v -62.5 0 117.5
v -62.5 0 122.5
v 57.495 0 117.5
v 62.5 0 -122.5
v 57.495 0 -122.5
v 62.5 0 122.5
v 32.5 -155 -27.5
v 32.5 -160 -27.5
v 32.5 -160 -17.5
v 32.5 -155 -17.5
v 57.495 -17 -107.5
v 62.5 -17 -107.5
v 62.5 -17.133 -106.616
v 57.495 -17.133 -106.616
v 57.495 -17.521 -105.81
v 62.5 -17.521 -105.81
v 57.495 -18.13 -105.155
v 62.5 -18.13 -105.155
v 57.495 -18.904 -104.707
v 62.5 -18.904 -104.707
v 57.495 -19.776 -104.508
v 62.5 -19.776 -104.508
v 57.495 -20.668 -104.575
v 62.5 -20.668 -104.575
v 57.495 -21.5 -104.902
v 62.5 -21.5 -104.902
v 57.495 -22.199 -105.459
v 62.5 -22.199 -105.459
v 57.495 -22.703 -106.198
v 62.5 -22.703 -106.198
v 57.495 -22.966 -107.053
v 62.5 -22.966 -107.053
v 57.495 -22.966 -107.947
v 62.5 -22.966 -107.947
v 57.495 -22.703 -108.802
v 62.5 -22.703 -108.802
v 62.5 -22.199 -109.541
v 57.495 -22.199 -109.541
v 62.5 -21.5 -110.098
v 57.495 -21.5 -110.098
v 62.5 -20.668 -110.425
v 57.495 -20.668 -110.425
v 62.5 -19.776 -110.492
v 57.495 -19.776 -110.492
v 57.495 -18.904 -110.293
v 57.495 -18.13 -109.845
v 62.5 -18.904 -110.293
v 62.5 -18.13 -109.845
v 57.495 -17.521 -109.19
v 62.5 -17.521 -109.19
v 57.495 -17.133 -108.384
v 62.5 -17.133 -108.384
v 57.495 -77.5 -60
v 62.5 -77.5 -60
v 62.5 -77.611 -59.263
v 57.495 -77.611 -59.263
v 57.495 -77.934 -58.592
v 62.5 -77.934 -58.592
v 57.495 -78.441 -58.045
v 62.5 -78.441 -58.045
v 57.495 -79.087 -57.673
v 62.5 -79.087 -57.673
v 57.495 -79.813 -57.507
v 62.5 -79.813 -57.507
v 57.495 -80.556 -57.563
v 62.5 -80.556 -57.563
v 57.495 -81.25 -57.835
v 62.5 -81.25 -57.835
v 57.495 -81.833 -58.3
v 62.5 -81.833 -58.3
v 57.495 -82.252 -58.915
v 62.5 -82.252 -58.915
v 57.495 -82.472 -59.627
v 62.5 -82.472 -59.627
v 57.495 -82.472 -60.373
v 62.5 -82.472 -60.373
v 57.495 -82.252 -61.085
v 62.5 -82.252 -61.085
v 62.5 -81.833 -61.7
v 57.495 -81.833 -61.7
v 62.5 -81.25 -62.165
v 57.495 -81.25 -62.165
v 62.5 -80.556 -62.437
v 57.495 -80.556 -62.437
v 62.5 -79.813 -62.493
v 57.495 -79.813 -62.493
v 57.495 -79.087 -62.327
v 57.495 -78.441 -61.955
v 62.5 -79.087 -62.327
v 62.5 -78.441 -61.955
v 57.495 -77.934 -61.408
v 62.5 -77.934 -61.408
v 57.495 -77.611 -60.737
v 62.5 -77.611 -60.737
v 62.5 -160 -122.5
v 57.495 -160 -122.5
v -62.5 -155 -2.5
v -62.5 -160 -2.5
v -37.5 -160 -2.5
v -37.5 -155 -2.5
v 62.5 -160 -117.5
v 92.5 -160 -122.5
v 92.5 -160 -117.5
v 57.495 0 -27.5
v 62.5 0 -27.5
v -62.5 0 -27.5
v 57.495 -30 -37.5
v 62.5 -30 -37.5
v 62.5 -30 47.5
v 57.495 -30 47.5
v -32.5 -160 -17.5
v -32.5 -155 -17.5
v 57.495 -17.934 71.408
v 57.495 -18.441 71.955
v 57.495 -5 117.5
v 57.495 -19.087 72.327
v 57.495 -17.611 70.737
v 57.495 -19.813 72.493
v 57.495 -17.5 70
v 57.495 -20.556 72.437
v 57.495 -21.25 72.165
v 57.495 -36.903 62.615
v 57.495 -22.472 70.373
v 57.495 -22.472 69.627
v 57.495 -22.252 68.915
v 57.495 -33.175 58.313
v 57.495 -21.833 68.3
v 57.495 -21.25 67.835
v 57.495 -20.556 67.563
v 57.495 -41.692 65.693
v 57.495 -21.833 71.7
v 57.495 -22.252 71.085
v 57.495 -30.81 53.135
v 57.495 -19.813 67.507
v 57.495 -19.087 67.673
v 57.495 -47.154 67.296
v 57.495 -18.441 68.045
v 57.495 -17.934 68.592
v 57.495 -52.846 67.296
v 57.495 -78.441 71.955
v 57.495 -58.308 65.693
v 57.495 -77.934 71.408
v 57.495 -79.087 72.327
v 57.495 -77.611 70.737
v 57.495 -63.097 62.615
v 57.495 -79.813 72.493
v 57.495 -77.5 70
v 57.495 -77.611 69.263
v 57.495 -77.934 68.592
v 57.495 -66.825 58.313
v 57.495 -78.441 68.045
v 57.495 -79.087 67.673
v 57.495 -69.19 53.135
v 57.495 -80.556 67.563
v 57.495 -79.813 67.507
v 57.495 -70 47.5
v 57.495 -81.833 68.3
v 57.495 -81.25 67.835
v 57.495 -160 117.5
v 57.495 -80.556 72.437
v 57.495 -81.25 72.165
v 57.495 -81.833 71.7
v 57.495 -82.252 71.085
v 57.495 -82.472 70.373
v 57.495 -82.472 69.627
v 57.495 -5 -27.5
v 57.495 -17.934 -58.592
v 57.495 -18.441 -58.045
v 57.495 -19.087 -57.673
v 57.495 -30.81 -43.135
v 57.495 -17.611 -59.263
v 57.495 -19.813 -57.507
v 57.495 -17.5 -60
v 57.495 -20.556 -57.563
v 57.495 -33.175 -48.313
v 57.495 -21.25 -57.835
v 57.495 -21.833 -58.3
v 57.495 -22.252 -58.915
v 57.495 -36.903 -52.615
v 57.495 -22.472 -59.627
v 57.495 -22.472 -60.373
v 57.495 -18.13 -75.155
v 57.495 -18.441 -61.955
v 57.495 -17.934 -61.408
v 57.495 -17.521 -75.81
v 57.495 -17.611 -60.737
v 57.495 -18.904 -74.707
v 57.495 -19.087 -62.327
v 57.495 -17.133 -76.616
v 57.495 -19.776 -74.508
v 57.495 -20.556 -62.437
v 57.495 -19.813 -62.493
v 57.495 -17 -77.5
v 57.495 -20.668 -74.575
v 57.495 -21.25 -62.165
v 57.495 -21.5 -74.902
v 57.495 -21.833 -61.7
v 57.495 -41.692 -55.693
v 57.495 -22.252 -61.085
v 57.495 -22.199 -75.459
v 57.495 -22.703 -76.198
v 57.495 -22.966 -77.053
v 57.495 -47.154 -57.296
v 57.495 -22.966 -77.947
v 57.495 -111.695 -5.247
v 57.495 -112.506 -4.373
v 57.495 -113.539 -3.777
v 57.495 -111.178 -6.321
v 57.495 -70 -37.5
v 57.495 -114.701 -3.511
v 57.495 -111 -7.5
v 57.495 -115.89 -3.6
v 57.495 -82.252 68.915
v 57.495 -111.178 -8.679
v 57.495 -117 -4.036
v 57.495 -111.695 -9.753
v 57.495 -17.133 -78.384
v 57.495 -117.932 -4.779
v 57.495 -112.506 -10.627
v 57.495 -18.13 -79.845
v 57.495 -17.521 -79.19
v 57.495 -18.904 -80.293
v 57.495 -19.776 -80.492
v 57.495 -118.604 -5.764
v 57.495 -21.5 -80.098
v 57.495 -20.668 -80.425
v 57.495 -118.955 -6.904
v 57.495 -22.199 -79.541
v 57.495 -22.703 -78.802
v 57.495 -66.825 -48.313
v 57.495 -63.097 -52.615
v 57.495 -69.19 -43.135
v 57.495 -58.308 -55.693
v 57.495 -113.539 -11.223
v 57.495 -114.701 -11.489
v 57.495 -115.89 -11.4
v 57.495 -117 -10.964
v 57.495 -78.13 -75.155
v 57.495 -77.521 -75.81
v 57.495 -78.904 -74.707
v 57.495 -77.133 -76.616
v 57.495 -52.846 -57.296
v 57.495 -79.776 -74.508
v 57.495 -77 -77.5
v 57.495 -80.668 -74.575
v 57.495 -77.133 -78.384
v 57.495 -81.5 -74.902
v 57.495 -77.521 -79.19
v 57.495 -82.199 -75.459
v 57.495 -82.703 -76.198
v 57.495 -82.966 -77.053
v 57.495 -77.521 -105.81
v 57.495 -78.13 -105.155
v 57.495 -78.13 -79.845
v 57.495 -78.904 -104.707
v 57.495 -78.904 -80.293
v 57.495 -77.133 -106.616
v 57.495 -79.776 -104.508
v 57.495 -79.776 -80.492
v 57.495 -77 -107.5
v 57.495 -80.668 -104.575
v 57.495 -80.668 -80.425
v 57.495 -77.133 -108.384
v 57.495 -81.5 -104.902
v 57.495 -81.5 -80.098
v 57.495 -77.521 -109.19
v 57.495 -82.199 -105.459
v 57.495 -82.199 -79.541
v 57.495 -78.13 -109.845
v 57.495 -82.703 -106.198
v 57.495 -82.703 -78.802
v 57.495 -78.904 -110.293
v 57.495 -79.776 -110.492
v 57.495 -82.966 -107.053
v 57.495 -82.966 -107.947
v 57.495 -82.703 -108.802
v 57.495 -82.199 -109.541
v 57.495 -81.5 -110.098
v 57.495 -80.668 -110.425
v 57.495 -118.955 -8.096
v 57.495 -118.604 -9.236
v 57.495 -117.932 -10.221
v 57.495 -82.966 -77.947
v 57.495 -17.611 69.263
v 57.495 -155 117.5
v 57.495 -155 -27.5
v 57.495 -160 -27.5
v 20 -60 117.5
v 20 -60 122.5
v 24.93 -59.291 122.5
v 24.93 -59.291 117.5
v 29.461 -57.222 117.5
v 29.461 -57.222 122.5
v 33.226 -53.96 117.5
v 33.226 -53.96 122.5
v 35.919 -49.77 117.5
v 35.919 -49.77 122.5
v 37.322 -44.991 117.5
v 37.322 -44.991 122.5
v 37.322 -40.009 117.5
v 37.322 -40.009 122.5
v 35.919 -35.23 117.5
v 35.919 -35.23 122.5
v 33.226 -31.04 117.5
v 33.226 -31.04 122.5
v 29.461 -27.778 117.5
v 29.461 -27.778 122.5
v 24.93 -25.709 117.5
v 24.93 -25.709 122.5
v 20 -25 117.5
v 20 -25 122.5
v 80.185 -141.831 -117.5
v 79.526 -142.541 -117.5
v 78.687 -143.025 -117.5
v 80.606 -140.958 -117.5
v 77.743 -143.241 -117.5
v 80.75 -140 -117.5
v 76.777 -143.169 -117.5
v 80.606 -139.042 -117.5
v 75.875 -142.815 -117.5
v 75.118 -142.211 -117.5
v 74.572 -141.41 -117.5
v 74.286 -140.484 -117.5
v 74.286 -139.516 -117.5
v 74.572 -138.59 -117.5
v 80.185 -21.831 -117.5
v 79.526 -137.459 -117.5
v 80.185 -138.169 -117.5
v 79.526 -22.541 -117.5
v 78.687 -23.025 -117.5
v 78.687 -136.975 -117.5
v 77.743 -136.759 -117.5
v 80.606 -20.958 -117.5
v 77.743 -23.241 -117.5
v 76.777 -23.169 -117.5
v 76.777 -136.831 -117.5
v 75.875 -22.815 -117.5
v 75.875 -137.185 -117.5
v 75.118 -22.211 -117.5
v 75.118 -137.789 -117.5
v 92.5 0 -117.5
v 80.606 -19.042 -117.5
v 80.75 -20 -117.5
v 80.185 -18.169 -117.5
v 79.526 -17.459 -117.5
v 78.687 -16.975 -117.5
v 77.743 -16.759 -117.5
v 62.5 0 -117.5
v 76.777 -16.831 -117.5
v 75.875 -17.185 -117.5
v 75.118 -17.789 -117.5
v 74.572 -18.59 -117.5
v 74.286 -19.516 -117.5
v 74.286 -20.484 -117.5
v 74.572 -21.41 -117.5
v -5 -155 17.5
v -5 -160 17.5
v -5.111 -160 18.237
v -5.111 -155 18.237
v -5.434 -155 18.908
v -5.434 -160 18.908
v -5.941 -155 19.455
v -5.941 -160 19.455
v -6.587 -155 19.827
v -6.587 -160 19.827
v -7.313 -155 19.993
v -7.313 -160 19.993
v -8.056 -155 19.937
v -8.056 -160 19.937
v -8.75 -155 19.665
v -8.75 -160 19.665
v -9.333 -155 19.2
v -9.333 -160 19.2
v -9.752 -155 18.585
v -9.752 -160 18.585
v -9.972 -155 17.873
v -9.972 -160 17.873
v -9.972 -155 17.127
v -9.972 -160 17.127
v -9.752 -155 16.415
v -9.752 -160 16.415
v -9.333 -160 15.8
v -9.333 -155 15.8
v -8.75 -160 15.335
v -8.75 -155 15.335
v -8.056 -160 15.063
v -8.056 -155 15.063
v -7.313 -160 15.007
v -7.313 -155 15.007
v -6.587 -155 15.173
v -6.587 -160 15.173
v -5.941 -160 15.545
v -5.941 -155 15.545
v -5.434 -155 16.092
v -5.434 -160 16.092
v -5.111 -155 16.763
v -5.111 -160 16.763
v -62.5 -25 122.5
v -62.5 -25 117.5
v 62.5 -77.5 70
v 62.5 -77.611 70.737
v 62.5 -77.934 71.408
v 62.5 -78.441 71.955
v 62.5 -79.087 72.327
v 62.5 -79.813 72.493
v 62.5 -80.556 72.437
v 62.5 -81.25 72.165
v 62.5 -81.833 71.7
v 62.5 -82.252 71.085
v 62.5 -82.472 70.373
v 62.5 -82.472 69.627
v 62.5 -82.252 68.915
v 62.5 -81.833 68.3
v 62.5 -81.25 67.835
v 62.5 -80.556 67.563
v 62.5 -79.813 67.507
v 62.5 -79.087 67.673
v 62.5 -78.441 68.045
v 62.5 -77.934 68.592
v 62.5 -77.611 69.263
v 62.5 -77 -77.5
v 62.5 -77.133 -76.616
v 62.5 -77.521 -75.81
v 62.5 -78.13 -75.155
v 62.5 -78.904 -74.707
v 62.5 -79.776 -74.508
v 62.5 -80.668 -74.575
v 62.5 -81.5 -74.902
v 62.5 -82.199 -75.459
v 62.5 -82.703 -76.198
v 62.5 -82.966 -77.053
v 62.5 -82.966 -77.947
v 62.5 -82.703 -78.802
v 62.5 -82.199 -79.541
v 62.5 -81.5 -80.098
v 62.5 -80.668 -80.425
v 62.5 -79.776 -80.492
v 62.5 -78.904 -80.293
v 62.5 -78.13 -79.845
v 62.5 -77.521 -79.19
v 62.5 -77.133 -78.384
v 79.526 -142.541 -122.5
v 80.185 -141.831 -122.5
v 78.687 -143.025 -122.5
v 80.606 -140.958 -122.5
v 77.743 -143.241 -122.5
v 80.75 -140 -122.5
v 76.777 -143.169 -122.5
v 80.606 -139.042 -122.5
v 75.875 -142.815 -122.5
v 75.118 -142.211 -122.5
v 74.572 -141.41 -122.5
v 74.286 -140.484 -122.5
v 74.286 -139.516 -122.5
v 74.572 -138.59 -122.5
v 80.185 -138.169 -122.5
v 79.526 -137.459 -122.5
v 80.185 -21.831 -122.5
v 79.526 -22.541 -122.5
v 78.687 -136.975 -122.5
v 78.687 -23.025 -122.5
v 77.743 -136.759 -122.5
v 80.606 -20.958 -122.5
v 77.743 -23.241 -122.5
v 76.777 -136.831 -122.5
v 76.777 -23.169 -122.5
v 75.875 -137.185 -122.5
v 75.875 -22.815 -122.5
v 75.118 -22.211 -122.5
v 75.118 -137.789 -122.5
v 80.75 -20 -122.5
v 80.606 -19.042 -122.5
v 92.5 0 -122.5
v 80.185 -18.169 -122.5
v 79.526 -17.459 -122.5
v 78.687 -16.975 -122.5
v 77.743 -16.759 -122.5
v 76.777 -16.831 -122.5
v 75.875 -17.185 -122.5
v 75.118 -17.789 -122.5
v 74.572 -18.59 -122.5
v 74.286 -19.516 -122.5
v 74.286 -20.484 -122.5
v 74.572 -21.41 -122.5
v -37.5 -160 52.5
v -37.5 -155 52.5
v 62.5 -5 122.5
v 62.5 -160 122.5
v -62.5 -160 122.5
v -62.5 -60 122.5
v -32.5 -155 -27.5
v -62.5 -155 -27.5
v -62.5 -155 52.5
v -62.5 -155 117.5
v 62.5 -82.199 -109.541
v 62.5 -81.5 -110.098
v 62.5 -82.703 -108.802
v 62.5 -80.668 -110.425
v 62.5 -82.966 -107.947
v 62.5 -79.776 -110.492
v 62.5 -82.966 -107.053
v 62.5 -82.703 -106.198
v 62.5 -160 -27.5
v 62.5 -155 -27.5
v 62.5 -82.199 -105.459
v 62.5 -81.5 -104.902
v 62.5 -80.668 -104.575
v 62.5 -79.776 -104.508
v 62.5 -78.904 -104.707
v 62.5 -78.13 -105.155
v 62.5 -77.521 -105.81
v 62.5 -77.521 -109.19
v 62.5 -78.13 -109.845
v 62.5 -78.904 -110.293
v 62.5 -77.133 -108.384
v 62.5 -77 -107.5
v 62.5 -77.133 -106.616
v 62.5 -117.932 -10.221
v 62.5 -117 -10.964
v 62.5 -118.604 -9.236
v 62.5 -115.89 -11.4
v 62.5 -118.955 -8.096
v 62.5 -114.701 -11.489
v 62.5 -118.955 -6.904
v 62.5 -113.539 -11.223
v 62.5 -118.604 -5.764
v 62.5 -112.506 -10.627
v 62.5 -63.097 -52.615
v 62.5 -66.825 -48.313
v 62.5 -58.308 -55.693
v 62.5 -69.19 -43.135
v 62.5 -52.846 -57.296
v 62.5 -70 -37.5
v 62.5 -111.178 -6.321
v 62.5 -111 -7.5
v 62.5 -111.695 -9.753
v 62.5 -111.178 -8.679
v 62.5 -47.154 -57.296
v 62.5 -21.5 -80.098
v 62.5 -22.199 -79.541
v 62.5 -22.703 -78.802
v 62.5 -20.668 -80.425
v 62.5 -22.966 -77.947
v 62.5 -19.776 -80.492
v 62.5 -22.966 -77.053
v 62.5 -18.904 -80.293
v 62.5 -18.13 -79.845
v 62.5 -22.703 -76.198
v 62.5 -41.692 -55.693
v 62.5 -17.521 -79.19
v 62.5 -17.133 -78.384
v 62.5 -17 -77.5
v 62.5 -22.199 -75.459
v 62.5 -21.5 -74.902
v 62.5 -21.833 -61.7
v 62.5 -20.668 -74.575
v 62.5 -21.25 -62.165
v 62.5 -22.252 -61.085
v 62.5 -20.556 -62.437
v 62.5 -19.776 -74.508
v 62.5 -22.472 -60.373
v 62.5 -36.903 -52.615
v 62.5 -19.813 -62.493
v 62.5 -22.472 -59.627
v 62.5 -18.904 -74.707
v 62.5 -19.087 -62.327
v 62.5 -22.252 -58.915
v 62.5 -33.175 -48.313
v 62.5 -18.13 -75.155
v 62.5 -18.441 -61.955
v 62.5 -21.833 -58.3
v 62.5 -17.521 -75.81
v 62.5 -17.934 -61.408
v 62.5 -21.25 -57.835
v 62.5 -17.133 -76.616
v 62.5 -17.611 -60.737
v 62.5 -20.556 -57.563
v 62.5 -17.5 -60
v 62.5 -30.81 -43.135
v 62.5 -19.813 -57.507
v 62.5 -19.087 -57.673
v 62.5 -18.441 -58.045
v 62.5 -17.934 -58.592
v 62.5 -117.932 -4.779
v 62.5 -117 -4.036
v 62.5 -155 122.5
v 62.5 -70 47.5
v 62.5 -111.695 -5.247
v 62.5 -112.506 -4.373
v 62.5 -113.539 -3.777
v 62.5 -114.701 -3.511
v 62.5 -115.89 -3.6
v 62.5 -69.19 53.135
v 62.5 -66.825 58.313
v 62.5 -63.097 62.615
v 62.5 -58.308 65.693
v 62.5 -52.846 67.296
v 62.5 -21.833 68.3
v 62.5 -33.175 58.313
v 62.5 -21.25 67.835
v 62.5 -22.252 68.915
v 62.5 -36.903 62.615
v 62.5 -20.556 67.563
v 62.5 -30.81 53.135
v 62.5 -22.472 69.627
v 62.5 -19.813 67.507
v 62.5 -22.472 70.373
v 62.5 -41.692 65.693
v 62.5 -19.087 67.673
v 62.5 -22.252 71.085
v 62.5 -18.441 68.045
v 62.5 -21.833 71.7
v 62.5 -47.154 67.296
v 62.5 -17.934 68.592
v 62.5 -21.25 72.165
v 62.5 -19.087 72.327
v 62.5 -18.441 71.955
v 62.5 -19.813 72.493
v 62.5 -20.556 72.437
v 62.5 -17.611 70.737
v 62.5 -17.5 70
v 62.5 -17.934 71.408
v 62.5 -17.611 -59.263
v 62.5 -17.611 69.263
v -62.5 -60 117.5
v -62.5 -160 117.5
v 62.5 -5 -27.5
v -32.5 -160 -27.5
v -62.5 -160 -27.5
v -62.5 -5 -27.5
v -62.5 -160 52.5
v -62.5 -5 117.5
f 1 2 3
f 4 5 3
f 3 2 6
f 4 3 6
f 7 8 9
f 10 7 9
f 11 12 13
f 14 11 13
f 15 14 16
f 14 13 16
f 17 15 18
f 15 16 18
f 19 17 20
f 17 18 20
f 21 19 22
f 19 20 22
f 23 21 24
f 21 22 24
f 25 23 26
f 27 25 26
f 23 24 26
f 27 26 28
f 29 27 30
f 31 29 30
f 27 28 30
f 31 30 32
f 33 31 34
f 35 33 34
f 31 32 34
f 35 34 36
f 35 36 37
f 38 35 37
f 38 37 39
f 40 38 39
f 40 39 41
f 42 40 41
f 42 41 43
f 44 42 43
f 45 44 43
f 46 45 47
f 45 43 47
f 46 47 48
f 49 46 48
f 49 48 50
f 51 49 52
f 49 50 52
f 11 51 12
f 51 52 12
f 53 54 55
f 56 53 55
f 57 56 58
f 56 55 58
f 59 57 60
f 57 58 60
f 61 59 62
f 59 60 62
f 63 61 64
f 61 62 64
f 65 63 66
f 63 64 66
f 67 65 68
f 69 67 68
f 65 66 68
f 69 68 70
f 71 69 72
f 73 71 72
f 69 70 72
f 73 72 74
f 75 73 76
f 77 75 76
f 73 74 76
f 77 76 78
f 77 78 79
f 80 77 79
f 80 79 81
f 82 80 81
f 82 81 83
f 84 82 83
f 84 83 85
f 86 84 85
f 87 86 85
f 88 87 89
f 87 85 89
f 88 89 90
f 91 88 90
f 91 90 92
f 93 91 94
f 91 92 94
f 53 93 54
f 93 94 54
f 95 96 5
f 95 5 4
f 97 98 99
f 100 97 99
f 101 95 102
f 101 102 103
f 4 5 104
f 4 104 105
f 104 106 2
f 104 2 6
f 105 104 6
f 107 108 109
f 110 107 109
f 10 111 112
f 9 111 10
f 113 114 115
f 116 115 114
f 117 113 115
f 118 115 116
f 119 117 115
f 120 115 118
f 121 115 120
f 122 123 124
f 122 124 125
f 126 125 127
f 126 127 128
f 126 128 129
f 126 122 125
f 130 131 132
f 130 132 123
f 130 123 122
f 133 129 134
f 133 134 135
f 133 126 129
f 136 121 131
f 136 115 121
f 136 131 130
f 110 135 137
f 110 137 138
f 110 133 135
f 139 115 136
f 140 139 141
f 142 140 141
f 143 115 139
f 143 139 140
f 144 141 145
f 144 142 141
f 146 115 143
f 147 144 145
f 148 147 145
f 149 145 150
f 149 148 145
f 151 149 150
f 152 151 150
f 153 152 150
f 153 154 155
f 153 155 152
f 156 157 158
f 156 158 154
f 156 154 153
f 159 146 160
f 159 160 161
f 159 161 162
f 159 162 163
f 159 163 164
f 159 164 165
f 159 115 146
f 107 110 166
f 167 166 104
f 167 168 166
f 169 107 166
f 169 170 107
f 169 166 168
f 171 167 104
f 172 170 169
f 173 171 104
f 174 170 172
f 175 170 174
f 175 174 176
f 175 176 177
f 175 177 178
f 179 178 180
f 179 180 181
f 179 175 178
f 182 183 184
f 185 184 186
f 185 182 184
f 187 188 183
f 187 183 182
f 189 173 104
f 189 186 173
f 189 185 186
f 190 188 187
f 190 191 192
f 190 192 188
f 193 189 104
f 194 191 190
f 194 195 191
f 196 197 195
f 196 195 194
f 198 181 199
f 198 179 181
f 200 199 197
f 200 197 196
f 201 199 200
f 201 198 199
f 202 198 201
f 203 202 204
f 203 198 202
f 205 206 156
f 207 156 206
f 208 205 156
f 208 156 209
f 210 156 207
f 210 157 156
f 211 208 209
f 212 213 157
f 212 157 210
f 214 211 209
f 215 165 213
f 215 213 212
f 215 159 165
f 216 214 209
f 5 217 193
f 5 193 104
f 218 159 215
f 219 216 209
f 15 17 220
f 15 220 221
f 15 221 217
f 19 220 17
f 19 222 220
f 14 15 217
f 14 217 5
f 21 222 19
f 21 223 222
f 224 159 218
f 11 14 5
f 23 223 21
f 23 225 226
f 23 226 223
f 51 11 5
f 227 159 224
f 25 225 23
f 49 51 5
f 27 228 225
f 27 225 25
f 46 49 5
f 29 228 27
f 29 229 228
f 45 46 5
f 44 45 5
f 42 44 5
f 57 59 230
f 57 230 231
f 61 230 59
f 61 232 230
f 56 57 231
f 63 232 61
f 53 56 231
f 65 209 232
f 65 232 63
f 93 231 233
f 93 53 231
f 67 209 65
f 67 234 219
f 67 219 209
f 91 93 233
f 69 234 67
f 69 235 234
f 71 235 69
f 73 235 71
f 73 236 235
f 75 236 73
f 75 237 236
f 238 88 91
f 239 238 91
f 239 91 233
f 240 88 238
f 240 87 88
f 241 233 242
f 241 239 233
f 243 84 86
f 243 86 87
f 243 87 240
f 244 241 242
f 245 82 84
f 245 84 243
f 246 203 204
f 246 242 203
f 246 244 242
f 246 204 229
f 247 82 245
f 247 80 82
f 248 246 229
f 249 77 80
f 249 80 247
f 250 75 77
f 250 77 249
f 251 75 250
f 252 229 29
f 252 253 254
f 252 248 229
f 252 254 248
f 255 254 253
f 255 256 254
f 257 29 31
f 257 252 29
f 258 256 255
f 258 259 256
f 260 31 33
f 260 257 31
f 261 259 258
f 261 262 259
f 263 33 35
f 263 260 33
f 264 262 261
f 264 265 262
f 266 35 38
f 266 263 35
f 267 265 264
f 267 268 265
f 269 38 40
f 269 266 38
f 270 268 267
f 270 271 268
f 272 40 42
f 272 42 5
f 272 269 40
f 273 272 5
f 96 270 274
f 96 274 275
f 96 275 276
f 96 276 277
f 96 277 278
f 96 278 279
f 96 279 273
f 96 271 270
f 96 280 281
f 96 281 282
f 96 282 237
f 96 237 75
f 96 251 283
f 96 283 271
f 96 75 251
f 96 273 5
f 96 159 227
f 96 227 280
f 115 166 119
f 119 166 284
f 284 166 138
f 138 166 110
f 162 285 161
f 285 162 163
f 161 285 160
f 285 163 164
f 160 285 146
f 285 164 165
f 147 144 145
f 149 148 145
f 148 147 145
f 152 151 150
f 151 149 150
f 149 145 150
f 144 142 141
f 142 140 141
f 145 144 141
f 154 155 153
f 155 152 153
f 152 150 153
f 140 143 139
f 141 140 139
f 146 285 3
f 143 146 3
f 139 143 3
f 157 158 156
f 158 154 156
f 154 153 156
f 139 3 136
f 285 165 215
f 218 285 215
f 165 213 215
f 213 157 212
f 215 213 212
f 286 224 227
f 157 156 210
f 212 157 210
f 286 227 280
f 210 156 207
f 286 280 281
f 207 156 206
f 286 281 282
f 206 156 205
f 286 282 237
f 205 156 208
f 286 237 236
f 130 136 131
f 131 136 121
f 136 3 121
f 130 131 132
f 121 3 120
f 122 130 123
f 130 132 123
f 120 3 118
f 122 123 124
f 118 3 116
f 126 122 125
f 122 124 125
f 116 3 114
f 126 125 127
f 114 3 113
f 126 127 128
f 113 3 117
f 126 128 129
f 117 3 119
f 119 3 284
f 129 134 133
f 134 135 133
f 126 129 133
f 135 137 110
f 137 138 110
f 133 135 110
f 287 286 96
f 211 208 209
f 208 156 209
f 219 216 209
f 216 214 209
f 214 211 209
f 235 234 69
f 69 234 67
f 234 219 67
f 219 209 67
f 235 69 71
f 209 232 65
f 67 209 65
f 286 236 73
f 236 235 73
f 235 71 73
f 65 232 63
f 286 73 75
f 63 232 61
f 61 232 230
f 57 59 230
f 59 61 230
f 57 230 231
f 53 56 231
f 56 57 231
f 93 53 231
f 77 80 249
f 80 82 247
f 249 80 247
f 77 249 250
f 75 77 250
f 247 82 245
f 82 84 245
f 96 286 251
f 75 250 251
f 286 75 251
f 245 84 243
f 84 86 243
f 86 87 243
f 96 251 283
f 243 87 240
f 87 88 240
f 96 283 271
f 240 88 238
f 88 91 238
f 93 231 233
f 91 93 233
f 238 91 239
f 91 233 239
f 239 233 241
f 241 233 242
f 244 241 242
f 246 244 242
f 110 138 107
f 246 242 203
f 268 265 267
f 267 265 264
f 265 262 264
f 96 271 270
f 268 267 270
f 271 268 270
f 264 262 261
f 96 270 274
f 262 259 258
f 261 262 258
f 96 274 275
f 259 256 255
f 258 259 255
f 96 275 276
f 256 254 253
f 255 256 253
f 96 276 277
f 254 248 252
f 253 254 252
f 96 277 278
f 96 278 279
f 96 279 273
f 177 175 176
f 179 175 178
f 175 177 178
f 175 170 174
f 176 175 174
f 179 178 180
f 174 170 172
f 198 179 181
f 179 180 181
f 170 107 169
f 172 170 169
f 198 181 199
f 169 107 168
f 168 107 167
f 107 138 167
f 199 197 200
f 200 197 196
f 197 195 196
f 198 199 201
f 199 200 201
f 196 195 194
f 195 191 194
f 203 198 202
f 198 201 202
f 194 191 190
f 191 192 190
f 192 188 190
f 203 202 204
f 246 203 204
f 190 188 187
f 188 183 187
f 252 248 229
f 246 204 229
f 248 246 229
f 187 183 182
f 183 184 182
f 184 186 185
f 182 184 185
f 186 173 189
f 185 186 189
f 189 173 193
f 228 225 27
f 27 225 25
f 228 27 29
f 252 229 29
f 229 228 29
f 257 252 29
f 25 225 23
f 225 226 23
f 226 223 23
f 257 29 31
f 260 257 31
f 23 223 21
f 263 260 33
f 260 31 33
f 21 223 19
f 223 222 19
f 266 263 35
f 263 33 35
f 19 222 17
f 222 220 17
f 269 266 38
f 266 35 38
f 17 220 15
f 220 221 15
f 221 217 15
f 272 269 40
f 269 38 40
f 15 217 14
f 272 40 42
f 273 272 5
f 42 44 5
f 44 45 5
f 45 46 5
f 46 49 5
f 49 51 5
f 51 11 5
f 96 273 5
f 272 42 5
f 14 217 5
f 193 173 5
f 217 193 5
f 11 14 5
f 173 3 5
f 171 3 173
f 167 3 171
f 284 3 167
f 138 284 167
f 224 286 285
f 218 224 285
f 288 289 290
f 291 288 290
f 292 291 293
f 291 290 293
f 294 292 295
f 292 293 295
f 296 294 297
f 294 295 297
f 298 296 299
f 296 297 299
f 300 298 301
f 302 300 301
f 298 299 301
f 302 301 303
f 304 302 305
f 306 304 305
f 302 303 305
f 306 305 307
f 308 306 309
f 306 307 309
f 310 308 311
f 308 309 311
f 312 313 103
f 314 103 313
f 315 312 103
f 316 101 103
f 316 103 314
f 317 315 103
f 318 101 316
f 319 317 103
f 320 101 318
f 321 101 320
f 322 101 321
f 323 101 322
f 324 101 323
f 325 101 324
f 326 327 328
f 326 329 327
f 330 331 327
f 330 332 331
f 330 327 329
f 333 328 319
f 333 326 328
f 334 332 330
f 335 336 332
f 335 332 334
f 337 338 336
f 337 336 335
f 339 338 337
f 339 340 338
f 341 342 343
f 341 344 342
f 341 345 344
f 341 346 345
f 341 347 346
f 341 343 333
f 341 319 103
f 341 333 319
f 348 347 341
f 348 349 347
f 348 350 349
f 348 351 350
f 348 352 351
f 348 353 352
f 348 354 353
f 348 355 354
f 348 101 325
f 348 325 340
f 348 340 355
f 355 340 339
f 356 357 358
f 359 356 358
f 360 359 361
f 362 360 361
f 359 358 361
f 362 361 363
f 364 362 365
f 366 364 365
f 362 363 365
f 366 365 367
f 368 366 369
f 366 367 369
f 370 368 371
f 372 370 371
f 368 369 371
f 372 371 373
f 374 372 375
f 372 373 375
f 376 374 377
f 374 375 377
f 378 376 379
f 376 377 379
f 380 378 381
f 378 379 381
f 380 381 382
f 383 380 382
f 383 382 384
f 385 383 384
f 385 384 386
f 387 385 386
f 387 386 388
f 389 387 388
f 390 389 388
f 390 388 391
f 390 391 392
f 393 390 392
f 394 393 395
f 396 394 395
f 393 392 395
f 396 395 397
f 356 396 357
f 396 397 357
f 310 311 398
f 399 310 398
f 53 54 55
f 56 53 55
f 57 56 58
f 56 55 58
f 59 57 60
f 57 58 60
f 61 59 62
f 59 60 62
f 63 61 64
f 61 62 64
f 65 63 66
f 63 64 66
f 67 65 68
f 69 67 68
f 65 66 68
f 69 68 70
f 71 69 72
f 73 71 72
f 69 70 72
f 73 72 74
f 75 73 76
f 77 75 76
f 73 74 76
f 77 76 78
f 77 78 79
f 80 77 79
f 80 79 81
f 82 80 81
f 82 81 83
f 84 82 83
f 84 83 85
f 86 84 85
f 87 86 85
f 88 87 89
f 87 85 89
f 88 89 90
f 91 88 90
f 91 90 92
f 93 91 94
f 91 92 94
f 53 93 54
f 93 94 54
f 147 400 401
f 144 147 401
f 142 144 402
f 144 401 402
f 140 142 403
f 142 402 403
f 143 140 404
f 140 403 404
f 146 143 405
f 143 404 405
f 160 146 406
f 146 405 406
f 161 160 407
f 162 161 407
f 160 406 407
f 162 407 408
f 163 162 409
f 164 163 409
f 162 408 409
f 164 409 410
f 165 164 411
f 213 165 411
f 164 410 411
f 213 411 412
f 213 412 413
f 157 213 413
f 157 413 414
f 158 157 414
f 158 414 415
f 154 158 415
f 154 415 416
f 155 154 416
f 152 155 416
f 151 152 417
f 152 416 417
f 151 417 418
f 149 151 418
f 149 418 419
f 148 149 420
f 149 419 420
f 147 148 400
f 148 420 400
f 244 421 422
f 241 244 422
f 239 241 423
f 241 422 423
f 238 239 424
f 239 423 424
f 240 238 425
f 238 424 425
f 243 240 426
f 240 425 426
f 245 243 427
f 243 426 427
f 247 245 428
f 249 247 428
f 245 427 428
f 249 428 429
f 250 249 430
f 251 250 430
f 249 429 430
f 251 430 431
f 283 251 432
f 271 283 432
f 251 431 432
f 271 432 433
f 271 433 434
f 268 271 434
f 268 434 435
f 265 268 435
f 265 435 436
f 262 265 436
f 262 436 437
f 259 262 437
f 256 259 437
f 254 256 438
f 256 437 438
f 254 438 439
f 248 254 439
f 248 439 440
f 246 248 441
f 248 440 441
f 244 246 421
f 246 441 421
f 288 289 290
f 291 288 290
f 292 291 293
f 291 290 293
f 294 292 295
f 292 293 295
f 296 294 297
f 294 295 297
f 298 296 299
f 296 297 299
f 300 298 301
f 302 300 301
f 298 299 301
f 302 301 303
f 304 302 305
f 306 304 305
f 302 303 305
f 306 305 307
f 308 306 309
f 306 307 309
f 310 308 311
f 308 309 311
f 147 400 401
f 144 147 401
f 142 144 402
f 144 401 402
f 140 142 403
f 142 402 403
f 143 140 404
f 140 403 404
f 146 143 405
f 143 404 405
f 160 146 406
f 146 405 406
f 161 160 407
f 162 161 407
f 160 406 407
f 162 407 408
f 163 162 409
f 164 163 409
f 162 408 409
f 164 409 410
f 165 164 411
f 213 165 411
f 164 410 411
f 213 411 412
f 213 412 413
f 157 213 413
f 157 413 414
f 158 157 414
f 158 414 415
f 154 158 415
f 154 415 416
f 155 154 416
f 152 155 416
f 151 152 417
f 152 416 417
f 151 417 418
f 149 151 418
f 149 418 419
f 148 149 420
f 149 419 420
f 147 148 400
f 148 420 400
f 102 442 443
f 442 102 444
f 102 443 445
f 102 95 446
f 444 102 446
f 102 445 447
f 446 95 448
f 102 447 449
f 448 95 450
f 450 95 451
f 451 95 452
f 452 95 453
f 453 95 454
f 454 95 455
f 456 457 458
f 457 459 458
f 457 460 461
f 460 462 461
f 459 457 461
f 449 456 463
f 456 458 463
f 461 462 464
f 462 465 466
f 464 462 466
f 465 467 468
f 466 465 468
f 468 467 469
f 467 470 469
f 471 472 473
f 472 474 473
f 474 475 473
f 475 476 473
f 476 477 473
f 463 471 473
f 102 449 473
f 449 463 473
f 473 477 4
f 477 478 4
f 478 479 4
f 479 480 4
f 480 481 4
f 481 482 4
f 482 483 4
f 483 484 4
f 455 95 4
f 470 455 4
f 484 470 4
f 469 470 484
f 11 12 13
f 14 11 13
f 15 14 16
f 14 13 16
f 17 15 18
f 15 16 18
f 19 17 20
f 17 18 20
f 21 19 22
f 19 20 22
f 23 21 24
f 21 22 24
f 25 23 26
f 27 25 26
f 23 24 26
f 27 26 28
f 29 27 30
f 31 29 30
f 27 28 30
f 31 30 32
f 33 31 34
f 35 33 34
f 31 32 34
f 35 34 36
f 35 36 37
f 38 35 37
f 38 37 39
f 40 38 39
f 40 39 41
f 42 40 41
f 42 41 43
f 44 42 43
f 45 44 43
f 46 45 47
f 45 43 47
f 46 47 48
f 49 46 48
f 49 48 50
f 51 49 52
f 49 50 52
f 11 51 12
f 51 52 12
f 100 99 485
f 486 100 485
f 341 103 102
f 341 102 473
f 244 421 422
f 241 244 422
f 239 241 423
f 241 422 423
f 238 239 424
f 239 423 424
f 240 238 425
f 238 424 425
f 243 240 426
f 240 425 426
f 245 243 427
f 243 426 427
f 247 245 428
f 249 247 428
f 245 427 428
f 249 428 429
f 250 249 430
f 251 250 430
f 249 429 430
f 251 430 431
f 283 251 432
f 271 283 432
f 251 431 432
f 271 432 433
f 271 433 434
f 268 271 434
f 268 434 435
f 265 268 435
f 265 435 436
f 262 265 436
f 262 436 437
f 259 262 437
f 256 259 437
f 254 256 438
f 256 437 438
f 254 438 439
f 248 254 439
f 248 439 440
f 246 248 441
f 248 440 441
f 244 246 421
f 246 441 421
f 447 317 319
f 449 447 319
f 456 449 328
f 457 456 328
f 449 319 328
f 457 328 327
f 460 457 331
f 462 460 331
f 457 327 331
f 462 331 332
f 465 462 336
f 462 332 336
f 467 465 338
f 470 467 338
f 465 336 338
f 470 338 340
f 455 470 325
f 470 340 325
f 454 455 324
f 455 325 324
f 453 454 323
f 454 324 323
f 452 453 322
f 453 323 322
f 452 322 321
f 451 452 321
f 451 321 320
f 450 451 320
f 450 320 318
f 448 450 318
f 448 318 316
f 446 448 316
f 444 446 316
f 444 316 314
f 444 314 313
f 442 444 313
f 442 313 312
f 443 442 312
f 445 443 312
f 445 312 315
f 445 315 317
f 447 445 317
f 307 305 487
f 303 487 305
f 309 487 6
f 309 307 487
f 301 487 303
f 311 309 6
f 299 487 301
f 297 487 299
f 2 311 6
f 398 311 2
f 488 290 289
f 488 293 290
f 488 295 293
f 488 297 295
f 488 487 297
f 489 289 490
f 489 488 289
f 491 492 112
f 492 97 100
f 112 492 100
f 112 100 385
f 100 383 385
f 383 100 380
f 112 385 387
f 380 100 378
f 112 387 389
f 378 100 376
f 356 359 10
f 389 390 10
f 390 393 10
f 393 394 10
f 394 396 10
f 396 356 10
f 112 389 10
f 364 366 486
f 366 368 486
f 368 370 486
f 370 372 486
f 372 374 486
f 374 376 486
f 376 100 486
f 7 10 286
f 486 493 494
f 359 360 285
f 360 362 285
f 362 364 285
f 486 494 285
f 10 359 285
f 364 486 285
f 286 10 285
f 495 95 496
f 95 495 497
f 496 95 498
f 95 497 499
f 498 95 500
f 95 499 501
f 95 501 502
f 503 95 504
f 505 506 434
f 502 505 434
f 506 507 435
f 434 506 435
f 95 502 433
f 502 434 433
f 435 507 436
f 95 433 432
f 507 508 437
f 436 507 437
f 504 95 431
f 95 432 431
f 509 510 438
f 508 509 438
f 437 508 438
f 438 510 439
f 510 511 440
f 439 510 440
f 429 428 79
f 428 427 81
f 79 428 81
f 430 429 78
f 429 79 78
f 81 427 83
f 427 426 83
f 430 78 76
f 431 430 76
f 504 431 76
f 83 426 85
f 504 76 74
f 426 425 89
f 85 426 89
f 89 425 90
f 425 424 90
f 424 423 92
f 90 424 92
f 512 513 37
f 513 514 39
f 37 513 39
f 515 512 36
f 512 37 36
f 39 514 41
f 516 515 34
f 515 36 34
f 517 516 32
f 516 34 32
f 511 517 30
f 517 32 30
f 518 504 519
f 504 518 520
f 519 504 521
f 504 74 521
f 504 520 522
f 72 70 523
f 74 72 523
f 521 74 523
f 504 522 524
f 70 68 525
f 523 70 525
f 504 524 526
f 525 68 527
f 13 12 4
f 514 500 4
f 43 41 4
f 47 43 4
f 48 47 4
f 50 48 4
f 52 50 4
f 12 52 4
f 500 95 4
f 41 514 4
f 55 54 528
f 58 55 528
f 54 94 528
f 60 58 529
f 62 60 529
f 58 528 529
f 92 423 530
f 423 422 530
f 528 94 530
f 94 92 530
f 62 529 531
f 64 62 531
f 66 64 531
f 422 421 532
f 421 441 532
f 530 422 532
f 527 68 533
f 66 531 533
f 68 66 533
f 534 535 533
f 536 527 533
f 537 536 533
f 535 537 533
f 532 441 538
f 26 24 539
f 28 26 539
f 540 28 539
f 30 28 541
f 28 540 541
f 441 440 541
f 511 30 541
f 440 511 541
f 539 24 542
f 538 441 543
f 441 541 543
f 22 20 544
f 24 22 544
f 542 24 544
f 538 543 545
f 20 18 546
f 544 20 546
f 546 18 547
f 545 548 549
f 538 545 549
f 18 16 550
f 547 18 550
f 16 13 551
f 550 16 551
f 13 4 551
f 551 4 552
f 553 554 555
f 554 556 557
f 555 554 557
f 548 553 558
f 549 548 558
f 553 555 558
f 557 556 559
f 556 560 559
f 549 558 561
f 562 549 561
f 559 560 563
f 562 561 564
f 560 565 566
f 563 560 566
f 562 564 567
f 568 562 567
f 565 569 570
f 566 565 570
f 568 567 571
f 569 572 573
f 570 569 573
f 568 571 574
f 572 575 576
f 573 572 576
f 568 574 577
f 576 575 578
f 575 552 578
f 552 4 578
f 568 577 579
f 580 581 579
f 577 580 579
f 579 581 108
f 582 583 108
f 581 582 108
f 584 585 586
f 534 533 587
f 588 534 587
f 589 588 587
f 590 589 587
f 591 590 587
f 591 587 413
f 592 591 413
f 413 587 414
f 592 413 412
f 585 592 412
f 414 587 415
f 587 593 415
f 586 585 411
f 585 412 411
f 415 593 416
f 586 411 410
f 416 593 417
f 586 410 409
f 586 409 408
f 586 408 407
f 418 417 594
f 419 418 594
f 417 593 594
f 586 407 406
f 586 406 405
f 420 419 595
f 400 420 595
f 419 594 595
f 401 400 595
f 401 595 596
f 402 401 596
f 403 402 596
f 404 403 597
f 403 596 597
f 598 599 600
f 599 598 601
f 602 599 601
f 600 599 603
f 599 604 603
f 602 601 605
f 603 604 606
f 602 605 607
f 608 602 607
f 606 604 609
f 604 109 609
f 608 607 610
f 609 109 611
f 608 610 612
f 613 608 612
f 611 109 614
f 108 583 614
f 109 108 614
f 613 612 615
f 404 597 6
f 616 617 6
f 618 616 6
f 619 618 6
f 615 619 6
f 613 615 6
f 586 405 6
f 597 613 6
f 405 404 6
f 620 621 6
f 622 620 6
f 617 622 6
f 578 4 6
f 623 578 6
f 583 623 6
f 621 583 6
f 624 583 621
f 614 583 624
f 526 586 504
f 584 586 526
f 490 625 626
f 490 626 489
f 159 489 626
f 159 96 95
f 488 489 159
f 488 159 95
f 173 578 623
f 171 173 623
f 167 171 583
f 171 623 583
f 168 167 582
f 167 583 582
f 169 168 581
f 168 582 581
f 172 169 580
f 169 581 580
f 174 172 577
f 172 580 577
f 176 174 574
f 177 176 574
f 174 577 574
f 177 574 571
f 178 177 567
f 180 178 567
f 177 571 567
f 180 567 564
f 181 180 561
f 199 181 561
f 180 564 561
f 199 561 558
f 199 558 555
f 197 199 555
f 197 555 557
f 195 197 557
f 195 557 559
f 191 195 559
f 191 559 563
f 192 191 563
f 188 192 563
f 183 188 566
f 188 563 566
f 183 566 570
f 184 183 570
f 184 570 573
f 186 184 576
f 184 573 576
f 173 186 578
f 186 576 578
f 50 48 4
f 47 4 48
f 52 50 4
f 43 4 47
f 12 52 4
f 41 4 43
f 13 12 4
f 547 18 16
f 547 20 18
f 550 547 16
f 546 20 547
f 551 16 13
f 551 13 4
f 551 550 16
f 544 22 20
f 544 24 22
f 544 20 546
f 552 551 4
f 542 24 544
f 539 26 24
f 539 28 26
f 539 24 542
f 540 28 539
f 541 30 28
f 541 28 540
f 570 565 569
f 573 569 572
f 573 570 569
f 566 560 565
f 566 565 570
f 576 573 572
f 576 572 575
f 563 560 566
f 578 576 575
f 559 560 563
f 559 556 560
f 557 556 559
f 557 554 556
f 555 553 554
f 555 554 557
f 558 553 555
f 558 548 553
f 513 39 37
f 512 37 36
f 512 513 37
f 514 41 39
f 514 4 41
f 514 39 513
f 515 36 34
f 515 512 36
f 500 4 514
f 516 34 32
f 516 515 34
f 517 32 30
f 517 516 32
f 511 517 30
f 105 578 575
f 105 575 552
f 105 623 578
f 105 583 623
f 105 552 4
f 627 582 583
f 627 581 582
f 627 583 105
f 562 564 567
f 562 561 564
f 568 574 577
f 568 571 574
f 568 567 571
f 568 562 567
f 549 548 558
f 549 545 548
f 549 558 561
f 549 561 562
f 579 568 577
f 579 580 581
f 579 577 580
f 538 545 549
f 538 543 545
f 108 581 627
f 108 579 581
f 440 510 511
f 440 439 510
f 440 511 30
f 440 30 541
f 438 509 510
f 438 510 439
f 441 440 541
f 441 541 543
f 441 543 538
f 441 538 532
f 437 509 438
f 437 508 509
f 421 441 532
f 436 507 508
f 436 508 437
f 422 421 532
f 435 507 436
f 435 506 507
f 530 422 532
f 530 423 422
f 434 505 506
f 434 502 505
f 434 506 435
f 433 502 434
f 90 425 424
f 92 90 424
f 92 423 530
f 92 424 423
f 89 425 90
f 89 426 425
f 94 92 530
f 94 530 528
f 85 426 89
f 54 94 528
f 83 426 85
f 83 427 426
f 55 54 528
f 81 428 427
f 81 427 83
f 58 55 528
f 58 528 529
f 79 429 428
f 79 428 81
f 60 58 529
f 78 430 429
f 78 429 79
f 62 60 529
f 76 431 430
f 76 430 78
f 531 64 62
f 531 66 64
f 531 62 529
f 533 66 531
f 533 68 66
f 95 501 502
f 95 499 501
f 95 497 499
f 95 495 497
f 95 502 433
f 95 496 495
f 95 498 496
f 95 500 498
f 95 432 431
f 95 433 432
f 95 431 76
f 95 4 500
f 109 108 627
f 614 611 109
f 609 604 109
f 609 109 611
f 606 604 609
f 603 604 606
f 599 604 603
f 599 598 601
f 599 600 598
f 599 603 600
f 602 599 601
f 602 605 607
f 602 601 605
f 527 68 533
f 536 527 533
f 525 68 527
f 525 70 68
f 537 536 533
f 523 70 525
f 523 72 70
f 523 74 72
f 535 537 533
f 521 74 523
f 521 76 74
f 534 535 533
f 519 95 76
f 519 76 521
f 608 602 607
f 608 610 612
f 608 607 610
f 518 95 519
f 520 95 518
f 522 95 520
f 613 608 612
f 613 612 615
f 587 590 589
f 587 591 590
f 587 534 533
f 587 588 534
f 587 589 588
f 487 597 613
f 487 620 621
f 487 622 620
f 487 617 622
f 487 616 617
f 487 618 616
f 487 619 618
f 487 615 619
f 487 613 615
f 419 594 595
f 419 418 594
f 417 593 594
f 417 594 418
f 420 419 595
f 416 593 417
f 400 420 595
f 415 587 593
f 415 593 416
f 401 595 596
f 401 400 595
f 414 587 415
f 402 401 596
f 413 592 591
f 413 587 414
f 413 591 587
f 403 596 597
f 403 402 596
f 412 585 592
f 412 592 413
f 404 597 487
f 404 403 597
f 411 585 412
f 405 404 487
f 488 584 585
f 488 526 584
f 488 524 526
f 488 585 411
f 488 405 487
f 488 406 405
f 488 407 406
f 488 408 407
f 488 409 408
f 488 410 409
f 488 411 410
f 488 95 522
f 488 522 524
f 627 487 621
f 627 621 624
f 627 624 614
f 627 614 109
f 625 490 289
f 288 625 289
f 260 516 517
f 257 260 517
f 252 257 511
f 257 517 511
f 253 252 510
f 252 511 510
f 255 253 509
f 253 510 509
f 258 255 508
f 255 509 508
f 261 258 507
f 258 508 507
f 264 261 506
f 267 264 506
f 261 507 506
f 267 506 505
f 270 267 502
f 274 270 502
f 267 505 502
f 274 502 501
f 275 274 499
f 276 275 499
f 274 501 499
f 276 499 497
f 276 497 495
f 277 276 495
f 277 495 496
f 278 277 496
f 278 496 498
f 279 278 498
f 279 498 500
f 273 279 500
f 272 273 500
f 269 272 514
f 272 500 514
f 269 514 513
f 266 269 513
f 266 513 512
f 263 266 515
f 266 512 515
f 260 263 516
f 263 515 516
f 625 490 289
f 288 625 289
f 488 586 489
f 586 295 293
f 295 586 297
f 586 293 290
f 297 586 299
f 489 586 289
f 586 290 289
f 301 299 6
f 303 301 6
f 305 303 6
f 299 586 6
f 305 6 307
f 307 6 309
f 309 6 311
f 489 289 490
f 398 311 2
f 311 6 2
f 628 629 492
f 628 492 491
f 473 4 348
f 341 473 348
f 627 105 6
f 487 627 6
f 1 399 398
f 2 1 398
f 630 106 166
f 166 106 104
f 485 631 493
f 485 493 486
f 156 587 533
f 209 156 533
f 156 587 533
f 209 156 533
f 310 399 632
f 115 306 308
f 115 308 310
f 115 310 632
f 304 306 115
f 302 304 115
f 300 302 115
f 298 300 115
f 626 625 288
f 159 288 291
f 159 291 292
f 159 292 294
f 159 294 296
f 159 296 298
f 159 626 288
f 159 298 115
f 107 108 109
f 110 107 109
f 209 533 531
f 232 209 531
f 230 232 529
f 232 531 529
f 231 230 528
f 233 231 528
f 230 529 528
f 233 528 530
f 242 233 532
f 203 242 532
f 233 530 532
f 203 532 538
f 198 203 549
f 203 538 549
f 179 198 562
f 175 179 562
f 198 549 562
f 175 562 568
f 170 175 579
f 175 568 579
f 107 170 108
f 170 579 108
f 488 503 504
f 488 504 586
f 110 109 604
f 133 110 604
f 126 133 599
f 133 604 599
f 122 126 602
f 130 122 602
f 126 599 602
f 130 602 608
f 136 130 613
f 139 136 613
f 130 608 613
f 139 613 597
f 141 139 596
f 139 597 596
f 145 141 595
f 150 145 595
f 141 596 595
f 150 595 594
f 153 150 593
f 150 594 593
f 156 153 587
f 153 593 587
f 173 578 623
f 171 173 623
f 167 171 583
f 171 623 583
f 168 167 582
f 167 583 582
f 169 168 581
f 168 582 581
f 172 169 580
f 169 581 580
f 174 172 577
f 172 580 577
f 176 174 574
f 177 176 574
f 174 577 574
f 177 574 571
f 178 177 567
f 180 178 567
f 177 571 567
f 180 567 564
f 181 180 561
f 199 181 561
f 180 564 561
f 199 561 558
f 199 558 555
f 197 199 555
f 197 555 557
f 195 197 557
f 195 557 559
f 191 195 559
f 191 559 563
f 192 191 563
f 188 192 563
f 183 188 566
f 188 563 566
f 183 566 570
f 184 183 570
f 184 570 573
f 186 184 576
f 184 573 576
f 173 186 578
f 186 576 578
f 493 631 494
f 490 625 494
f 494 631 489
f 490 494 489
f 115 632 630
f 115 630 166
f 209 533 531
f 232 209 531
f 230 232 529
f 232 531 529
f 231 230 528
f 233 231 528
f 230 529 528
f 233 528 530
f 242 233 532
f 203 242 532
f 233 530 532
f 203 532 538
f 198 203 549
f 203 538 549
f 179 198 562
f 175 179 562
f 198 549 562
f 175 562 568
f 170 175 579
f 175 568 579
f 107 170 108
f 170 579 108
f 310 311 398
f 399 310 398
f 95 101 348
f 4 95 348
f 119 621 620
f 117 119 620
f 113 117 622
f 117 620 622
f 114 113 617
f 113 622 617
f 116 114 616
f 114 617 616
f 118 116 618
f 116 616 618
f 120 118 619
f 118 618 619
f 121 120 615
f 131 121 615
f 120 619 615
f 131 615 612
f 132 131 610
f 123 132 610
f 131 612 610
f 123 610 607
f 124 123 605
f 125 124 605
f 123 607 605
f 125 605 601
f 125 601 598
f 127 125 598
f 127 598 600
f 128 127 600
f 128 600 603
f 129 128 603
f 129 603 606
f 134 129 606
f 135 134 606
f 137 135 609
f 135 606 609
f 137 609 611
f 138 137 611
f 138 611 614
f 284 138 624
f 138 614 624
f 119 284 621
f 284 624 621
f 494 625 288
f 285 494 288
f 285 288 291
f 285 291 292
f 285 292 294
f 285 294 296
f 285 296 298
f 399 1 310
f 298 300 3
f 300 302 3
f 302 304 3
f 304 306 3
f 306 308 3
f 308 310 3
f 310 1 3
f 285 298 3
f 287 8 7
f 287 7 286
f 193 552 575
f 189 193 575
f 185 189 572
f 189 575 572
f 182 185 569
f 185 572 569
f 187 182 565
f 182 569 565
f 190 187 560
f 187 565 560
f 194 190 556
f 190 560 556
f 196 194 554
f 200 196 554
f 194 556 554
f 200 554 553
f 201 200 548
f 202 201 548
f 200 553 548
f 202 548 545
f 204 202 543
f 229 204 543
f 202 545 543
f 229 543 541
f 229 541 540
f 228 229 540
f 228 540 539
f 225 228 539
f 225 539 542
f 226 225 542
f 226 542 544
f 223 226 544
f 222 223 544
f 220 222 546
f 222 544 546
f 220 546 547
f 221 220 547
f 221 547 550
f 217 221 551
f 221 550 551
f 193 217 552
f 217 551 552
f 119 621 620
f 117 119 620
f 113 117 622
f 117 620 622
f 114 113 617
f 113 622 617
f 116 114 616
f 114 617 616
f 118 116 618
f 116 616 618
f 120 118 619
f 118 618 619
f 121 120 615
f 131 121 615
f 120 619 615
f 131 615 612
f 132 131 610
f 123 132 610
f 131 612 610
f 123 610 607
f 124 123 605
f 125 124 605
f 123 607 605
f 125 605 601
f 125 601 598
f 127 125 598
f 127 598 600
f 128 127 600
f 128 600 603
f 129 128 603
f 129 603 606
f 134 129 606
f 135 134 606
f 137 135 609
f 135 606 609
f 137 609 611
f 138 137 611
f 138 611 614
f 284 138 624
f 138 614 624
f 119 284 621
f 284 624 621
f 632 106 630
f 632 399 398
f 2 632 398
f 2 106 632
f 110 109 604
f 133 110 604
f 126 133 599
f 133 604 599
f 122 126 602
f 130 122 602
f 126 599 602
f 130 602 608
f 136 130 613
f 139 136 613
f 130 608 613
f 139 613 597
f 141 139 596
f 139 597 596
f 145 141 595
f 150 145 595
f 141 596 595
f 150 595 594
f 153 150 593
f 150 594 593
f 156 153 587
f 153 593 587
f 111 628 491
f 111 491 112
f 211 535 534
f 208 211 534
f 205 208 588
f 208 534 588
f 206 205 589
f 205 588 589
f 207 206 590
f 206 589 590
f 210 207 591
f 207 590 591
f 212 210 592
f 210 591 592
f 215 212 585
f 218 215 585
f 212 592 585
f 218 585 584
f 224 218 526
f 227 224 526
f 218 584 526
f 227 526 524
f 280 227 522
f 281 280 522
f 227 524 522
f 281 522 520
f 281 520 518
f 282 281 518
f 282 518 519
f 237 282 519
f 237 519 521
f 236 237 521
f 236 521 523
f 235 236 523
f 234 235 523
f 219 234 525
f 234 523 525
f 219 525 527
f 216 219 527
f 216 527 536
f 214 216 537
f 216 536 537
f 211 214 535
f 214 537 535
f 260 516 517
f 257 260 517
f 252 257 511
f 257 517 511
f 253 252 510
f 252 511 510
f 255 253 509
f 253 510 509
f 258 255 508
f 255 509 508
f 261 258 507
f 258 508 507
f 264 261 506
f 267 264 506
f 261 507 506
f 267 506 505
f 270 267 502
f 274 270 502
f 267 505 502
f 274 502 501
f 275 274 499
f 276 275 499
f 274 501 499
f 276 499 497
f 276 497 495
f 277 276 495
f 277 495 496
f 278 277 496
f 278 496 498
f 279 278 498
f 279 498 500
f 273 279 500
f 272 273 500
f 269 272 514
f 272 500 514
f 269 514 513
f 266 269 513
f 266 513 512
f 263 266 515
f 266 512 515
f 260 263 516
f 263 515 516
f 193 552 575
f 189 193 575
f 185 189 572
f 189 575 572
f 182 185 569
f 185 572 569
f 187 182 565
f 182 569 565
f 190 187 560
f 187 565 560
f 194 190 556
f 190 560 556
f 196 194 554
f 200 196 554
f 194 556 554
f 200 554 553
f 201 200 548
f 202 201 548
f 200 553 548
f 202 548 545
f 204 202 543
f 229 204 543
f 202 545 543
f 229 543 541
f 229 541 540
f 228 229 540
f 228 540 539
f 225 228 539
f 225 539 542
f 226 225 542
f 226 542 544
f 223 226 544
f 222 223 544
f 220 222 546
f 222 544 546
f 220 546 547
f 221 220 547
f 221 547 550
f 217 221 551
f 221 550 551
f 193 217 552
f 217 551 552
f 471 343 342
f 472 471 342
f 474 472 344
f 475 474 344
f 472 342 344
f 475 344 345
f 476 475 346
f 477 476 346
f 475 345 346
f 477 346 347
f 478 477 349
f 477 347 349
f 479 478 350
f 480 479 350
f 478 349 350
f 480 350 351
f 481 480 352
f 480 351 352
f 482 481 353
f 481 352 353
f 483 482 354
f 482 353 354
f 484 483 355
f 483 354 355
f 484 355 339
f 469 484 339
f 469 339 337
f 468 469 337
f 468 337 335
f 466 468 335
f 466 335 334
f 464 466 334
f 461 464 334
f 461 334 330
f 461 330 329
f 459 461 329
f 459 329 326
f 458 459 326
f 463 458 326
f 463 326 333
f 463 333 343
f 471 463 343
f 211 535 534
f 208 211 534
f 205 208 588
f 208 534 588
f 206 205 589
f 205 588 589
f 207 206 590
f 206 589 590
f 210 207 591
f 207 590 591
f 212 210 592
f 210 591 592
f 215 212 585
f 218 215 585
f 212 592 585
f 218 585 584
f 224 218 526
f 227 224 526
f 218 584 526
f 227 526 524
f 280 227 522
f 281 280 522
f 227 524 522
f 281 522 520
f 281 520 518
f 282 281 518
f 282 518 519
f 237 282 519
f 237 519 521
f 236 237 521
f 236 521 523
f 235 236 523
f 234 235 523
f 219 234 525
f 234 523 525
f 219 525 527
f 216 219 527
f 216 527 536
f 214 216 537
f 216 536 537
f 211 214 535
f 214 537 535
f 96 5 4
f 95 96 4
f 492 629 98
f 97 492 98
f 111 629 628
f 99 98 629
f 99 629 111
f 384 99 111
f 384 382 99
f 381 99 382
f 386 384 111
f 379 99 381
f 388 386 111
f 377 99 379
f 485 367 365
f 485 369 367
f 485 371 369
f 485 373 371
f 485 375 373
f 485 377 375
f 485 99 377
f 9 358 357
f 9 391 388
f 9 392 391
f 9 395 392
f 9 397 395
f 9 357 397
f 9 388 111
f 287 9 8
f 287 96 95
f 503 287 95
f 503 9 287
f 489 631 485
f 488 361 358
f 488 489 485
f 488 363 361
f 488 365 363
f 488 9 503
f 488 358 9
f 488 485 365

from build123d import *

# Parameters (mm, degrees)
F0_W      = 0.004675
F0_H      = 240
F0_H_2    = 5
F1_DEPTH  = 160
F2_W      = 125
F2_H      = 150
F3_DEPTH  = 5
F7_DEPTH  = 25
F8_W      = 160
F8_H      = 5
F9_DEPTH  = 30
F10_R     = 3.25
F11_DEPTH = 25
F13_DEPTH = 5.004675
F14_R     = 2.5
F15_DEPTH = 5.004675
F16_W     = 25
F16_H     = 55
F17_DEPTH = 5
F18_R     = 2.5
F18_W     = 65
F18_H     = 10
F19_DEPTH = 5
F20_R     = 4
F20_R_2   = 3
F21_DEPTH = 5.004675


with BuildPart() as f1:
    # F0 (on Front) → F1 (new body)
    with BuildSketch(Plane.XZ):
        Polygon((62.495325, 122.5), (-62.5, 122.5), (-62.5, 117.5), (57.495325, 117.5), (57.495325, -122.5), (62.495325, -122.5), (62.495325, 117.5), align=None)
        with Locations((62.497662, -2.5)):
            Rectangle(F0_W, F0_H)
        with Locations((62.497662, 120)):
            Rectangle(F0_W, F0_H_2)
    extrude(amount=F1_DEPTH)

    # F2 (on face) → F3 (join)
    with BuildSketch(Plane.XZ.offset(160)):
        with Locations((0, 47.5)):
            Rectangle(F2_W, F2_H)
    extrude(amount=-F3_DEPTH)


with BuildPart() as f5_1:
    # F5: instance of F1
    add(f1.part.mirror(Plane(origin=(1.483739, -80, 44.470582), x_dir=(1, 0, 0), z_dir=(0, -1, 0))))


with BuildPart() as f7_tool:
    # F6 (on face) → F7 (new body)
    with BuildSketch(Plane.XY.offset(122.5)):
        with BuildLine():
            Line((-62.5, -25), (-62.5, -60))
            Line((-62.5, -60), (20, -60))
            ThreePointArc((20, -60), (37.5, -42.5), (20, -25))
            Line((20, -25), (-62.5, -25))
        make_face()
    extrude(amount=-F7_DEPTH)


with BuildPart() as f1_1:
    add(f1.part)

    # F7: cut by f7_tool
    add(f7_tool.part, mode=Mode.SUBTRACT)


with BuildPart() as f5_1_1:
    add(f5_1.part)

    # F7: cut by f7_tool
    add(f7_tool.part, mode=Mode.SUBTRACT)


with BuildPart() as f9:
    # F8 (on face) → F9 (new body)
    with BuildSketch(Plane.YZ.offset(62.5)):
        with Locations((-80, -120)):
            Rectangle(F8_W, F8_H)
    extrude(amount=F9_DEPTH)

    # F10 (on face) → F11 (cut)
    with BuildSketch(Plane.XY.offset(-117.5)):
        with Locations((77.5, -140)):
            Circle(F10_R)
        with Locations((77.5, -20)):
            Circle(F10_R)
    extrude(amount=-F11_DEPTH, mode=Mode.SUBTRACT)


with BuildPart() as f13_tool:
    # F12 (on face) → F13 (new body, through all)
    with BuildSketch(Plane.YZ.offset(62.5)):
        with BuildLine():
            Line((-30, -37.5), (-30, 47.5))
            ThreePointArc((-30, 47.5), (-50, 67.5), (-70, 47.5))
            Line((-70, 47.5), (-70, -37.5))
            ThreePointArc((-70, -37.5), (-50, -57.5), (-30, -37.5))
        make_face()
    extrude(amount=-F13_DEPTH)


with BuildPart() as f1_2:
    add(f1_1.part)

    # F13: cut by f13_tool
    add(f13_tool.part, mode=Mode.SUBTRACT)


with BuildPart() as f5_1_2:
    add(f5_1_1.part)

    # F13: cut by f13_tool
    add(f13_tool.part, mode=Mode.SUBTRACT)


with BuildPart() as f15_tool:
    # F14 (on face) → F15 (new body, through all)
    with BuildSketch(Plane.YZ.offset(62.5)):
        with Locations((-80, 70)):
            Circle(F14_R)
        with Locations((-20, 70)):
            Circle(F14_R)
        with Locations((-20, -60)):
            Circle(F14_R)
        with Locations((-80, -60)):
            Circle(F14_R)
    extrude(amount=-F15_DEPTH)


with BuildPart() as f1_3:
    add(f1_2.part)

    # F15: cut by f15_tool
    add(f15_tool.part, mode=Mode.SUBTRACT)

    # F16 (on face) → F17 (cut, through all)
    with BuildSketch(Plane.XZ.offset(160)):
        with Locations((-50, 25)):
            Rectangle(F16_W, F16_H)
    extrude(amount=-F17_DEPTH, mode=Mode.SUBTRACT)

    # F18 (on face) → F19 (cut, through all)
    with BuildSketch(Plane.XZ.offset(160)):
        with Locations((-7.5, 17.5)):
            Circle(F18_R)
        with Locations((0, -22.5)):
            Rectangle(F18_W, F18_H)
    extrude(amount=-F19_DEPTH, mode=Mode.SUBTRACT)


with BuildPart() as f5_1_3:
    add(f5_1_2.part)

    # F15: cut by f15_tool
    add(f15_tool.part, mode=Mode.SUBTRACT)


with BuildPart() as f21_tool:
    # F20 (on face) → F21 (new body, through all)
    with BuildSketch(Plane.YZ.offset(62.5)):
        with Locations((-115, -7.5)):
            Circle(F20_R)
        with Locations((-80, -77.5)):
            Circle(F20_R_2)
        with Locations((-20, -77.5)):
            Circle(F20_R_2)
        with Locations((-80, -107.5)):
            Circle(F20_R_2)
        with Locations((-20, -107.5)):
            Circle(F20_R_2)
    extrude(amount=-F21_DEPTH)


with BuildPart() as f1_4:
    add(f1_3.part)

    # F21: cut by f21_tool
    add(f21_tool.part, mode=Mode.SUBTRACT)


with BuildPart() as f5_1_4:
    add(f5_1_3.part)

    # F21: cut by f21_tool
    add(f21_tool.part, mode=Mode.SUBTRACT)


solid = Compound([f9.part, f1_4.part, f5_1_4.part])
